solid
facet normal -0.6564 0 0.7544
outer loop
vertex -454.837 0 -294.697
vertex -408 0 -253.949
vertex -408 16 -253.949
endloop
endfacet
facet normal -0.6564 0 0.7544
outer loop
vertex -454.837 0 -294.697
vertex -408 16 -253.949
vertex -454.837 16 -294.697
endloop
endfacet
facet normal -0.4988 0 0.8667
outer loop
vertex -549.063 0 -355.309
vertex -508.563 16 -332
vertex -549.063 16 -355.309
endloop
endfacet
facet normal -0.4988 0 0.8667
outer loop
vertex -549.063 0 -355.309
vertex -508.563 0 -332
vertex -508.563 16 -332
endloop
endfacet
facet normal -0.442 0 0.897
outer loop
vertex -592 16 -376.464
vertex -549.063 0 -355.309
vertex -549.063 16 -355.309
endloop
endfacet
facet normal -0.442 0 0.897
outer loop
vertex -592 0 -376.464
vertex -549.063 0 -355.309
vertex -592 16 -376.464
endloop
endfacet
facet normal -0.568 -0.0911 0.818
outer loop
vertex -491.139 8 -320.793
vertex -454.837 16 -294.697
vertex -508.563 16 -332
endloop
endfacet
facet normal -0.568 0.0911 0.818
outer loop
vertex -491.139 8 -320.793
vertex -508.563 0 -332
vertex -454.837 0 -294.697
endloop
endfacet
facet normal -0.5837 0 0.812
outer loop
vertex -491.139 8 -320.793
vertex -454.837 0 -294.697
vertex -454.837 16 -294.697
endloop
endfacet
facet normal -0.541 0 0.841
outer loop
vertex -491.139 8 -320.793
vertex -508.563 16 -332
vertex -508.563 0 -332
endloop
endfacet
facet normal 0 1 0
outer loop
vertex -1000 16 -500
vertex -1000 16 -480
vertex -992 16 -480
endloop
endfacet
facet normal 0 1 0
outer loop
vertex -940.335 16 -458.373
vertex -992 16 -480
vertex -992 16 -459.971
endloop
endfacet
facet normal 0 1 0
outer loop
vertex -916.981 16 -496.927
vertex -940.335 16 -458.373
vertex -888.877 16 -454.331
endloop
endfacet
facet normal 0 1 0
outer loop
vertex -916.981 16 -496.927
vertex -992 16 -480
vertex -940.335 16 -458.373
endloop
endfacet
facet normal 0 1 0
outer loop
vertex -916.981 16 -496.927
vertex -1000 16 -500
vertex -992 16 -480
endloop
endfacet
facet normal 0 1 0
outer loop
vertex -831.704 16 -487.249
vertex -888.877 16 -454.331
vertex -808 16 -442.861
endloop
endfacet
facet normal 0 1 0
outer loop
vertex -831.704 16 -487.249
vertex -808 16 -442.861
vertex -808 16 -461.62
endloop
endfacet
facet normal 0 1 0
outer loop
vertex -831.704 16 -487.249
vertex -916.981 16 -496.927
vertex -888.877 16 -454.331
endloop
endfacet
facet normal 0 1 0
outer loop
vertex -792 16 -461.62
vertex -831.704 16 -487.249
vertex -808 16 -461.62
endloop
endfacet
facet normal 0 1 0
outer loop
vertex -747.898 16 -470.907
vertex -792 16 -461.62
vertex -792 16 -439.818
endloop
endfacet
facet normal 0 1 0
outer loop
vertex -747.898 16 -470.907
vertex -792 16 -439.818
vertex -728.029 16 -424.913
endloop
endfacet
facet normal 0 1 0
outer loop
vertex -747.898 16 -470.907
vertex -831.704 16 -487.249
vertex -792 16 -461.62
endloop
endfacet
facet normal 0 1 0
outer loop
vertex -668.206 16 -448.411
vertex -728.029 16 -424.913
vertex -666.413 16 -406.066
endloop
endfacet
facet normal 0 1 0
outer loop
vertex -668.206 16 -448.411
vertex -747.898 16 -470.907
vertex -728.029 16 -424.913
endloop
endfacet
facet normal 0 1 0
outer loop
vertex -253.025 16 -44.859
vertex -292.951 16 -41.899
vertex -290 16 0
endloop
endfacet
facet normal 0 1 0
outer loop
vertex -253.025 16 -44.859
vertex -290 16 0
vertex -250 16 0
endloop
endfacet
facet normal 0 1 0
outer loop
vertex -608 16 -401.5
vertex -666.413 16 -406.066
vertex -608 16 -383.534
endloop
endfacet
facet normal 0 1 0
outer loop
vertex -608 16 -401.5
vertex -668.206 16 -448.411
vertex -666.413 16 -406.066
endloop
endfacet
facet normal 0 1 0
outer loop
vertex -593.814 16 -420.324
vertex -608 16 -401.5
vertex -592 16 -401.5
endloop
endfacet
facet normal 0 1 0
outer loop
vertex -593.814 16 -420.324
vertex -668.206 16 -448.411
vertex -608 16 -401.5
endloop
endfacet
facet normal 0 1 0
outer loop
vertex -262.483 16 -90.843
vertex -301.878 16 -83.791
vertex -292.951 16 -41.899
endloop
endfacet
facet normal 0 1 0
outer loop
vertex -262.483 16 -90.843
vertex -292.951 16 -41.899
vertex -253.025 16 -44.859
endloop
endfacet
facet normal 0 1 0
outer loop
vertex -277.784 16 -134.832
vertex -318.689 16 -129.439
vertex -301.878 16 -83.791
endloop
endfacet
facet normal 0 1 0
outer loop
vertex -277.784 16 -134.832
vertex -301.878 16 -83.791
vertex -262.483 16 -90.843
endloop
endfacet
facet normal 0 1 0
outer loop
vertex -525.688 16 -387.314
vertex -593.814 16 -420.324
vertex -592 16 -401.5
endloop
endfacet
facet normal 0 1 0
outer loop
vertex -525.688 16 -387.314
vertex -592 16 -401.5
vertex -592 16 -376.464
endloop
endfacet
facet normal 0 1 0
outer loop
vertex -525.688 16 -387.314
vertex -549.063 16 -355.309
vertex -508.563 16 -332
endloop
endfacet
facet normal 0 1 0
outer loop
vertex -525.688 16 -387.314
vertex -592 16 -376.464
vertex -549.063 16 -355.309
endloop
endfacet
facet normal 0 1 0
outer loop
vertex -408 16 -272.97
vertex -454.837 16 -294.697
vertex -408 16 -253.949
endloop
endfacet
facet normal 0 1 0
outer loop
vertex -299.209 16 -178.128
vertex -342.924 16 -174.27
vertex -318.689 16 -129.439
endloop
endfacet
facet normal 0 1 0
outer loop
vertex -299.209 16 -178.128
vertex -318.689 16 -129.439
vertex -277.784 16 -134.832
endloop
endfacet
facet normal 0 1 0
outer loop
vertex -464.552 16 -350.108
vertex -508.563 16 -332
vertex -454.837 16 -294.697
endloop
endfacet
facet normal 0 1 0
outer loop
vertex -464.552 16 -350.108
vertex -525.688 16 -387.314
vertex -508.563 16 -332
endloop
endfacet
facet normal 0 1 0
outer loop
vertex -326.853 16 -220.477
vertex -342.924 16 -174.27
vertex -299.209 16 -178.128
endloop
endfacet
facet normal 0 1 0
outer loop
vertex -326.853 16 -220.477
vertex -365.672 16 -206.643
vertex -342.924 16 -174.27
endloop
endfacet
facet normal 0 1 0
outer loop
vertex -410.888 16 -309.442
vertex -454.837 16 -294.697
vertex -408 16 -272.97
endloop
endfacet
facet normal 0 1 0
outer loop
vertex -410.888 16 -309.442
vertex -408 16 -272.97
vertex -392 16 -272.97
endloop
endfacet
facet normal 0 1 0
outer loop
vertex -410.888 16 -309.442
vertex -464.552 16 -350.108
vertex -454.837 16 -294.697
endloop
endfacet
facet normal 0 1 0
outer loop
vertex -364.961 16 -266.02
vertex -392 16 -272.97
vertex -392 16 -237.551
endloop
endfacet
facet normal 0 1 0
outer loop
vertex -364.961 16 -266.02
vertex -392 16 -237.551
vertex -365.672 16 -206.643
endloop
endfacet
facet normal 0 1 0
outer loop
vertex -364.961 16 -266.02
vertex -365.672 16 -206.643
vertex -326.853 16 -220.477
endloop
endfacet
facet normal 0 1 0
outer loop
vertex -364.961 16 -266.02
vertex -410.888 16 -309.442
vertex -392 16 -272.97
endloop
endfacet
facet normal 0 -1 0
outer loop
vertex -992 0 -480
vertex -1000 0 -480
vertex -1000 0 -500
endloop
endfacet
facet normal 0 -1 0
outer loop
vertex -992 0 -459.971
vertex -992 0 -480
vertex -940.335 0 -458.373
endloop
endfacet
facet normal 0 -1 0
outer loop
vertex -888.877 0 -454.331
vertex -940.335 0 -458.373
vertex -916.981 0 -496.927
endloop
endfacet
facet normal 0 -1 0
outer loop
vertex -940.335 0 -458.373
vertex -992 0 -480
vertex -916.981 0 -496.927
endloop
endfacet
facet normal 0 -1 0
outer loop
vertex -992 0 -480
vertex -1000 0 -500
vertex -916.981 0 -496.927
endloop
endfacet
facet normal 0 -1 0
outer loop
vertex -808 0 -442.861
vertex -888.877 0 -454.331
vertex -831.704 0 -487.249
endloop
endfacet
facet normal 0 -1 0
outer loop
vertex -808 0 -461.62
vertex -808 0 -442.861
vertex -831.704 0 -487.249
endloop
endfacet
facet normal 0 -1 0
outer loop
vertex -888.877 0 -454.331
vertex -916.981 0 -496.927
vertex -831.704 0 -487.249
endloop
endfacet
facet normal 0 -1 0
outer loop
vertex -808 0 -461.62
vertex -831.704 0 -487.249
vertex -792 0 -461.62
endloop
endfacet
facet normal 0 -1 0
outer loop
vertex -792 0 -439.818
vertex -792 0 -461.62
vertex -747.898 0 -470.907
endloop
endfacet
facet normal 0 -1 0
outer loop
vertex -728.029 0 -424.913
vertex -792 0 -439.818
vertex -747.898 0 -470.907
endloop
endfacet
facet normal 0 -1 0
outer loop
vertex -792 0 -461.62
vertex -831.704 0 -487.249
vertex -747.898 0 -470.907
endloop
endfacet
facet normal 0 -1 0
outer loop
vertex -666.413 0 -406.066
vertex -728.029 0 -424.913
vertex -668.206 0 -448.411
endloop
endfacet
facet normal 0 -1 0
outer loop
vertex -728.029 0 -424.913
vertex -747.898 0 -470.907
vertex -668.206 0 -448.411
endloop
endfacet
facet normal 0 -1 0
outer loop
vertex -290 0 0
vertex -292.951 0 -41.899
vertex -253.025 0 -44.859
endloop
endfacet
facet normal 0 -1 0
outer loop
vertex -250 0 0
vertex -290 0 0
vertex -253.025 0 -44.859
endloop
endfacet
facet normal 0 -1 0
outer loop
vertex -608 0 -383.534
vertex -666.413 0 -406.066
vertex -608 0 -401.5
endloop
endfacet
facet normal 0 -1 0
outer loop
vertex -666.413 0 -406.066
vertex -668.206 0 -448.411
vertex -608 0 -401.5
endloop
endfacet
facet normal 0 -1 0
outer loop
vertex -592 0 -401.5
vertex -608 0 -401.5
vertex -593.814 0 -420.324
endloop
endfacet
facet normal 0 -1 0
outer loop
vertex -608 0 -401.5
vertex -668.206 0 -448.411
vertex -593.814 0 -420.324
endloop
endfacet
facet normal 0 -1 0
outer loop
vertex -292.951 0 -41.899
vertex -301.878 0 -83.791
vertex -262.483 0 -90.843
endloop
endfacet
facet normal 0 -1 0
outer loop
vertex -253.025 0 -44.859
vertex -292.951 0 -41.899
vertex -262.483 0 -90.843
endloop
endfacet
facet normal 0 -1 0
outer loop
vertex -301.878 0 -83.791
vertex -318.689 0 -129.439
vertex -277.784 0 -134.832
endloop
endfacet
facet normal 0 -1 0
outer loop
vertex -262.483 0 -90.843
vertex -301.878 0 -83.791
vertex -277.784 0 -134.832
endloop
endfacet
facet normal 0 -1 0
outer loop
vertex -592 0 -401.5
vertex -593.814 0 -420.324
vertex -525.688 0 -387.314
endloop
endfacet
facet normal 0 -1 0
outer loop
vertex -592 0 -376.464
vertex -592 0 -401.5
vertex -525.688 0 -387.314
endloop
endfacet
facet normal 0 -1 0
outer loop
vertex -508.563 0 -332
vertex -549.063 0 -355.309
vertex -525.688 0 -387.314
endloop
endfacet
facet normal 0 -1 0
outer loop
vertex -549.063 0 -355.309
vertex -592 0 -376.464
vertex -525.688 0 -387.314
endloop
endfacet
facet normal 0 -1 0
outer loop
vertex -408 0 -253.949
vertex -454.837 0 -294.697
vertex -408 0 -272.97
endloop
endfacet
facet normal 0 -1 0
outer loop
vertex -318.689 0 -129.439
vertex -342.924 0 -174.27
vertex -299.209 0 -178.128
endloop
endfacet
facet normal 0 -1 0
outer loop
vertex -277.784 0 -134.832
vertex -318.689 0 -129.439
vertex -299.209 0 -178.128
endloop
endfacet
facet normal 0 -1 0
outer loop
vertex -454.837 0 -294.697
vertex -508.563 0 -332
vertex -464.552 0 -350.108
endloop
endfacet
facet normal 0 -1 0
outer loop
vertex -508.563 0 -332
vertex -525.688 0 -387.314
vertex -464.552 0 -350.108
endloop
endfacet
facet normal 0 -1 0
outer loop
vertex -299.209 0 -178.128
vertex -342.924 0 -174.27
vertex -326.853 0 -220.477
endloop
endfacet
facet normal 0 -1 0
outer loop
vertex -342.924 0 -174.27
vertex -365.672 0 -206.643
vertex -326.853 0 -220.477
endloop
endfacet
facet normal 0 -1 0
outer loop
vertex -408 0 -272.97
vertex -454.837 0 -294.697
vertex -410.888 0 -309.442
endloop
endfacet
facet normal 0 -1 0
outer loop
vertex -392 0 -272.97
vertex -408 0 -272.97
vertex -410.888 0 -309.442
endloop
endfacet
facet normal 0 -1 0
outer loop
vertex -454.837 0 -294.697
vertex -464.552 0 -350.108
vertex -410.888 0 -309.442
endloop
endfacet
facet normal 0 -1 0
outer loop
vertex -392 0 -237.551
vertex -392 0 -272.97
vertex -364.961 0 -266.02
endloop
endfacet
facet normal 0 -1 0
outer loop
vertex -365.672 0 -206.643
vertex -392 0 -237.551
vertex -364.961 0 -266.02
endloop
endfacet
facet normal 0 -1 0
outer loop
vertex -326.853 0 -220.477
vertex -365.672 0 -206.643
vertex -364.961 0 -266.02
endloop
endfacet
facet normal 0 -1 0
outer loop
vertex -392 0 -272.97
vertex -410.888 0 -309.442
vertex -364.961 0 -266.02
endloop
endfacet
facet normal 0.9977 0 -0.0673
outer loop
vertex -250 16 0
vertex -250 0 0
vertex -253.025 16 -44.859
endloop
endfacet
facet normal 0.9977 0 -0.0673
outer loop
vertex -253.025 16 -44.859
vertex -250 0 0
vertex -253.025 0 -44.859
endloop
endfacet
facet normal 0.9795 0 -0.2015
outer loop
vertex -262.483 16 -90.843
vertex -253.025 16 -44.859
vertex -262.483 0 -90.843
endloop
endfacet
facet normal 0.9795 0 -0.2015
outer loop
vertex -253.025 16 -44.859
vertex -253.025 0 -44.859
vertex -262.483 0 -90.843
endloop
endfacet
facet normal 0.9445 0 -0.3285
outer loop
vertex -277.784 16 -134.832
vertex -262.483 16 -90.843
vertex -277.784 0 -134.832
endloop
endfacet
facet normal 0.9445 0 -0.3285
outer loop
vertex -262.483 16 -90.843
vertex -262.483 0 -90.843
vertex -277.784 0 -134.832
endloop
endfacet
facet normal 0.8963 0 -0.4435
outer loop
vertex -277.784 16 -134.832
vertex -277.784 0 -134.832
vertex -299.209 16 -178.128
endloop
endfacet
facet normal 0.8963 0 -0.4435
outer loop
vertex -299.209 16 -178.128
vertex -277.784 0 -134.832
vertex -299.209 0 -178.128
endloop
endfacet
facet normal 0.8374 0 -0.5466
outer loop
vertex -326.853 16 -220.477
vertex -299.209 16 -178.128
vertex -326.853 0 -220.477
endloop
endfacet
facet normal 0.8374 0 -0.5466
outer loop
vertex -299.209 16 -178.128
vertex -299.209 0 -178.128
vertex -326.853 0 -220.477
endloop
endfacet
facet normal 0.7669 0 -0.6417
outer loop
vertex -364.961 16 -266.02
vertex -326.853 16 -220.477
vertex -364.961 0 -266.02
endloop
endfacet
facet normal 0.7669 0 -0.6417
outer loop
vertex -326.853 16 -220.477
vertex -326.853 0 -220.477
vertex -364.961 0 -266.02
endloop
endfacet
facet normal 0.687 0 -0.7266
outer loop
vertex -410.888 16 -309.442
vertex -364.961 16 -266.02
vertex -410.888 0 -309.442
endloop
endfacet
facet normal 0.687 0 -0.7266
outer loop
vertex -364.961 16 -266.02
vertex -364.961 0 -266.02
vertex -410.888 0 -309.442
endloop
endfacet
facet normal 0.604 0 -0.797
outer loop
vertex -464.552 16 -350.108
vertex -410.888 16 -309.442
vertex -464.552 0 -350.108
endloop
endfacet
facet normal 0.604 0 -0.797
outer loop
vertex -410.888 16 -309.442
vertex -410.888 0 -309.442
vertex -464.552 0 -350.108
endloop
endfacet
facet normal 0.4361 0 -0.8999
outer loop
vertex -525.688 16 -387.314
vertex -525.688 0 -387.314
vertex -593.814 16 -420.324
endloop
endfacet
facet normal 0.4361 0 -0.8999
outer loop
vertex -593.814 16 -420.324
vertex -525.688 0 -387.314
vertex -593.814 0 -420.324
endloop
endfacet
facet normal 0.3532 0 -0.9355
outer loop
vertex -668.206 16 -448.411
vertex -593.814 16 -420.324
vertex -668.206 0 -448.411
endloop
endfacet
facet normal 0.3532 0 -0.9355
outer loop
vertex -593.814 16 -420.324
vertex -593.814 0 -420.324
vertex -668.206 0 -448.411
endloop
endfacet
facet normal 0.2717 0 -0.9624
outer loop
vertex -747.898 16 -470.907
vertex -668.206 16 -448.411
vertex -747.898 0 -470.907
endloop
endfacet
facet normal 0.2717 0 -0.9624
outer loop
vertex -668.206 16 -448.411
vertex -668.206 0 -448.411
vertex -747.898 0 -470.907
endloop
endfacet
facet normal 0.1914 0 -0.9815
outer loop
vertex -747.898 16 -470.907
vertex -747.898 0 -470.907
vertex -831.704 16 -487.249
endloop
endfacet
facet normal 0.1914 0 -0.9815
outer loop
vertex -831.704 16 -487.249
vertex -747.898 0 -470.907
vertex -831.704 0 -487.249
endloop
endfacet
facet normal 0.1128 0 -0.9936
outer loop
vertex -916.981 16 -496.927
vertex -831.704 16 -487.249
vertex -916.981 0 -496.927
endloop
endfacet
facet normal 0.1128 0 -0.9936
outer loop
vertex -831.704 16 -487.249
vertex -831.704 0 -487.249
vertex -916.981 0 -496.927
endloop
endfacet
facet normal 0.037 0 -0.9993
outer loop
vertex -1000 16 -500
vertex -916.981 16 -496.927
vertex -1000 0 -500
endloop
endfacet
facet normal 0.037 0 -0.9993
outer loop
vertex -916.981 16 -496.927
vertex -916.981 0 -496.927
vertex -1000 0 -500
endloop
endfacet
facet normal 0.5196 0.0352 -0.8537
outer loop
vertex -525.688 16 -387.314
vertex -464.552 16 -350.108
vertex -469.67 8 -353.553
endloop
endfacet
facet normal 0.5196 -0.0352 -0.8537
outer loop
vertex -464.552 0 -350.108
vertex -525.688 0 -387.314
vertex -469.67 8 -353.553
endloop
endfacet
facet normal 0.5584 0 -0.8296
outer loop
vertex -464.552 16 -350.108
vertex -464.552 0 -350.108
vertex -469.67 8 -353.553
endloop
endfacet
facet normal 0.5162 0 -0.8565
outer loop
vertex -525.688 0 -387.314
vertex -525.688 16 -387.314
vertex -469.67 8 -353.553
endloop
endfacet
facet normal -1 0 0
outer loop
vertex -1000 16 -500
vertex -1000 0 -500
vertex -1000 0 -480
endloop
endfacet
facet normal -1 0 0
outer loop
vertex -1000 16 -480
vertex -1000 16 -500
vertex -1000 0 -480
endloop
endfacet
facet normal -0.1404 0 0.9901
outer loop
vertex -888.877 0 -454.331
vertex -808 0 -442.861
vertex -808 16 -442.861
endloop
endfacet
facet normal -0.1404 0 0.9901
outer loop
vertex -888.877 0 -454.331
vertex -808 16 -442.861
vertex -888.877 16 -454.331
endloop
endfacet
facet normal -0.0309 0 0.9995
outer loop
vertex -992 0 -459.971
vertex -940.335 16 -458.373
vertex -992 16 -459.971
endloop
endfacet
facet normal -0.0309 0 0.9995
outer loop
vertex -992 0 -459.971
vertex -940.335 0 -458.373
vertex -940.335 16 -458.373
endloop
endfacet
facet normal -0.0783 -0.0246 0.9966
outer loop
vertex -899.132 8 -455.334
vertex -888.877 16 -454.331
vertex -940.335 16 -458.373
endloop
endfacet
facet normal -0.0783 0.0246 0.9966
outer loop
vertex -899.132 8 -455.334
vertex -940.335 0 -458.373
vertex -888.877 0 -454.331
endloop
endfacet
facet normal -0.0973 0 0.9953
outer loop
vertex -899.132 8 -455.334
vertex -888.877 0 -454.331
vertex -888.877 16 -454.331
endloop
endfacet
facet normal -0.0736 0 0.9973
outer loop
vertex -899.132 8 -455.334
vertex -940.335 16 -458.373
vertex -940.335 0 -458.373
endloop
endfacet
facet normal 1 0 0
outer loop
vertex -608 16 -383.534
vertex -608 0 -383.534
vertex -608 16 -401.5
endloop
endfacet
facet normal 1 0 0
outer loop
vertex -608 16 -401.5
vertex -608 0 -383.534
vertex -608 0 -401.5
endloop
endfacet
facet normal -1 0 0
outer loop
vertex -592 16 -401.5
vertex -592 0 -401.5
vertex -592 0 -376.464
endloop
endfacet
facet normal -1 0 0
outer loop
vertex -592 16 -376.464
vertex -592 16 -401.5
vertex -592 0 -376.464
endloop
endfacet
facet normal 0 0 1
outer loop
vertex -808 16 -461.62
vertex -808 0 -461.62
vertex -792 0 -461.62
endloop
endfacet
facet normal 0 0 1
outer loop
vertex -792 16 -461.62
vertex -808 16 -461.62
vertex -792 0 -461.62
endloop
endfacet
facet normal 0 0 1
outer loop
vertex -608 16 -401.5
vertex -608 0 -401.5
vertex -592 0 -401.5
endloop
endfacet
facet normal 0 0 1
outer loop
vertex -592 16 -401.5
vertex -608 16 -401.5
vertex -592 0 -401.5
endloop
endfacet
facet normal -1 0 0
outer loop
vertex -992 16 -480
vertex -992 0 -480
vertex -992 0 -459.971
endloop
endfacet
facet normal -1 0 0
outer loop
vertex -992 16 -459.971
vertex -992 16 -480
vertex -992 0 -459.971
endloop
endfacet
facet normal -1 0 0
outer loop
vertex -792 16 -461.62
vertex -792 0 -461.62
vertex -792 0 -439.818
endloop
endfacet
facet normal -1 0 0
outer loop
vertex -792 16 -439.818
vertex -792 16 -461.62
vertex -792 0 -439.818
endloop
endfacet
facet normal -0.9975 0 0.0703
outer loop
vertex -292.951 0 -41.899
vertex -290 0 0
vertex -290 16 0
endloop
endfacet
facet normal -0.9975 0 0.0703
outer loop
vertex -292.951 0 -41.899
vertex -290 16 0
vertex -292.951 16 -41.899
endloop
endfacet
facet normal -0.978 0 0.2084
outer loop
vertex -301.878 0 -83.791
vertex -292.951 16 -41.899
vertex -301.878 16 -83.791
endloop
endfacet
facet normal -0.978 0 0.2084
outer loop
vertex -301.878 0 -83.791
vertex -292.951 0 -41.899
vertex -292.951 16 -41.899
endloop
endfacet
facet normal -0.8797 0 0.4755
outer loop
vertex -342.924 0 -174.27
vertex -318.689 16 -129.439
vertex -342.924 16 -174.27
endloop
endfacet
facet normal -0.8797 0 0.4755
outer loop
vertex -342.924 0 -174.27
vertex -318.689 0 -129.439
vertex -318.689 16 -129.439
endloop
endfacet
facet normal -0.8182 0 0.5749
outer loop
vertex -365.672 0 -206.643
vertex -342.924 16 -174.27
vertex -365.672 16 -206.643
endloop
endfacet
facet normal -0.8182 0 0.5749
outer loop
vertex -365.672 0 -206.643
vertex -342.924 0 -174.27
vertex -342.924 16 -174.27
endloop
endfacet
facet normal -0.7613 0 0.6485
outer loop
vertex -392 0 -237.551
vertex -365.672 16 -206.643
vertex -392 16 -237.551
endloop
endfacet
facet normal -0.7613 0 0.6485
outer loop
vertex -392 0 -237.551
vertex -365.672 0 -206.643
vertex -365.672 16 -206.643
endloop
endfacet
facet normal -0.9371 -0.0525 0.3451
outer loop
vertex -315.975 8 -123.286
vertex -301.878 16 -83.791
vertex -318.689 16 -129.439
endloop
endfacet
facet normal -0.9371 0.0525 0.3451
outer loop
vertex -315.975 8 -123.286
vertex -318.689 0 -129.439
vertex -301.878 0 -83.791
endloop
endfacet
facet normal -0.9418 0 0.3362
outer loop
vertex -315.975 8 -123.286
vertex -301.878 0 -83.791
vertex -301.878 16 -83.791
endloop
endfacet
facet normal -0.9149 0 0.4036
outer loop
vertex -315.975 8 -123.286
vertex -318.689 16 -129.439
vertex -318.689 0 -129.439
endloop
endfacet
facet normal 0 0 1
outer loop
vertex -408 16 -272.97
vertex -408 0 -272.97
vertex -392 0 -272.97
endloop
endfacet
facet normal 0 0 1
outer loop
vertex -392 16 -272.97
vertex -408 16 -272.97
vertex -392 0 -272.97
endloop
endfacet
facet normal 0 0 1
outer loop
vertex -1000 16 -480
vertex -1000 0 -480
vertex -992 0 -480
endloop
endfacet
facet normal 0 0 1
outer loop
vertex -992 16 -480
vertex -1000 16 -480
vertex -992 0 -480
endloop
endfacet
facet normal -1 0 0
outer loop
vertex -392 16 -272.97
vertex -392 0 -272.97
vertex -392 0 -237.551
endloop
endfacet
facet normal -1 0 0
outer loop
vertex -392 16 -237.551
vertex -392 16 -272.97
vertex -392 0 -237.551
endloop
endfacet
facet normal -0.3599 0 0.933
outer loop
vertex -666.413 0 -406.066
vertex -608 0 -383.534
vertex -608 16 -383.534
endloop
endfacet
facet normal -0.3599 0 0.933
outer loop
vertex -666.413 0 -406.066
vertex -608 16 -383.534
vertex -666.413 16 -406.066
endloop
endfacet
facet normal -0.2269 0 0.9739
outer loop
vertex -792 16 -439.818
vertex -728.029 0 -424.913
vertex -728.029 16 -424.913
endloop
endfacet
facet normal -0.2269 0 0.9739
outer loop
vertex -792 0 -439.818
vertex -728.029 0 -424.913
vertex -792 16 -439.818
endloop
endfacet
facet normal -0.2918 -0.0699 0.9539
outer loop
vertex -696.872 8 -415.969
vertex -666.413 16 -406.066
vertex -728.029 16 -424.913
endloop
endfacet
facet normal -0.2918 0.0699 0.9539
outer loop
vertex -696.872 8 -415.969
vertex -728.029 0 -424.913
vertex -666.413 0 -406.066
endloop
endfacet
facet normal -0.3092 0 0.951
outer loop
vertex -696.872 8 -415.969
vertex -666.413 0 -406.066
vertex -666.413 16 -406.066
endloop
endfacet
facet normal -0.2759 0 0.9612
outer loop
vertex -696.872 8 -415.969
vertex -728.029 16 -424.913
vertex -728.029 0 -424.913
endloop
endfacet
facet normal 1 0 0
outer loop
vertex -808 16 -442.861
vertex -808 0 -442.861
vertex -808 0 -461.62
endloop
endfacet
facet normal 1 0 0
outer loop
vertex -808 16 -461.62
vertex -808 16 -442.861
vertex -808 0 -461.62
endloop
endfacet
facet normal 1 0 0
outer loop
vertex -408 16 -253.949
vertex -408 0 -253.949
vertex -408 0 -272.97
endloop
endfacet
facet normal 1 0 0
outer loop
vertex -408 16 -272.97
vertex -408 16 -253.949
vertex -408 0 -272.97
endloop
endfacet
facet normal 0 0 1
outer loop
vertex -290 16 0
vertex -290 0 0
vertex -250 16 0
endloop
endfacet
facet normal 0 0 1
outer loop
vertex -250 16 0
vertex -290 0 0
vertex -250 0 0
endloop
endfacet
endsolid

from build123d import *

# Parameters (mm, degrees)
EXTRUDE_1_DEPTH = 16


with BuildPart() as part:
    # Эскиз1 → Бобышка-Вытянуть1 (new body)
    with BuildSketch(Plane(origin=(0, 0, 0), x_dir=(1, 0, 0), z_dir=(0, 1, 0))):
        with BuildLine():
            Line((-1000, 500), (-1000, 480))
            Line((-1000, 480), (-992, 480))
            Line((-992, 480), (-992, 459.970798518))
            add(Edge.make_bspline(
                [(-808, 442.861199089), (-898.256504918, 459.286414541), (-992, 459.970798518)],
                knots=[1.296964435, 1.296964435, 1.296964435, 1.559528483, 1.559528483, 1.559528483], degree=2, weights=[1, 0.991394885, 1]))
            Line((-808, 442.861199089), (-808, 461.62))
            Line((-808, 461.62), (-792, 461.62))
            Line((-792, 461.62), (-792, 439.817678769))
            add(Edge.make_bspline(
                [(-608, 383.533973809), (-693.710948609, 420.305994383), (-792, 439.817678769)],
                knots=[0.985900323, 0.985900323, 0.985900323, 1.273477477, 1.273477477, 1.273477477], degree=2, weights=[1, 0.989680221, 1]))
            Line((-608, 383.533973809), (-608, 401.5))
            Line((-608, 401.5), (-592, 401.5))
            Line((-592, 401.5), (-592, 376.464350057))
            add(Edge.make_bspline(
                [(-408, 253.948691099), (-482.120546549, 326.477961202), (-592, 376.464350057)],
                knots=[0.584835671, 0.584835671, 0.584835671, 0.958622489, 0.958622489, 0.958622489], degree=2, weights=[1, 0.982586203, 1]))
            Line((-408, 253.948691099), (-408, 272.97))
            Line((-408, 272.97), (-392, 272.97))
            Line((-392, 272.97), (-392, 237.551224808))
            add(Edge.make_bspline(
                [(-290, 0), (-290, 127.967655246), (-392, 237.551224808)],
                knots=[0, 0, 0, 0.542660036, 0.542660036, 0.542660036], degree=2, weights=[1, 0.963415286, 1]))
            Line((-290, 0), (-250, 0))
            add(Edge.make_bspline(
                [(-250, 0), (-250, 500), (-1000, 500)],
                knots=[3.141592654, 3.141592654, 3.141592654, 4.71238898, 4.71238898, 4.71238898], degree=2, weights=[1, 0.707106781, 1]))
        make_face()
    extrude(amount=EXTRUDE_1_DEPTH)


solid = part.part
